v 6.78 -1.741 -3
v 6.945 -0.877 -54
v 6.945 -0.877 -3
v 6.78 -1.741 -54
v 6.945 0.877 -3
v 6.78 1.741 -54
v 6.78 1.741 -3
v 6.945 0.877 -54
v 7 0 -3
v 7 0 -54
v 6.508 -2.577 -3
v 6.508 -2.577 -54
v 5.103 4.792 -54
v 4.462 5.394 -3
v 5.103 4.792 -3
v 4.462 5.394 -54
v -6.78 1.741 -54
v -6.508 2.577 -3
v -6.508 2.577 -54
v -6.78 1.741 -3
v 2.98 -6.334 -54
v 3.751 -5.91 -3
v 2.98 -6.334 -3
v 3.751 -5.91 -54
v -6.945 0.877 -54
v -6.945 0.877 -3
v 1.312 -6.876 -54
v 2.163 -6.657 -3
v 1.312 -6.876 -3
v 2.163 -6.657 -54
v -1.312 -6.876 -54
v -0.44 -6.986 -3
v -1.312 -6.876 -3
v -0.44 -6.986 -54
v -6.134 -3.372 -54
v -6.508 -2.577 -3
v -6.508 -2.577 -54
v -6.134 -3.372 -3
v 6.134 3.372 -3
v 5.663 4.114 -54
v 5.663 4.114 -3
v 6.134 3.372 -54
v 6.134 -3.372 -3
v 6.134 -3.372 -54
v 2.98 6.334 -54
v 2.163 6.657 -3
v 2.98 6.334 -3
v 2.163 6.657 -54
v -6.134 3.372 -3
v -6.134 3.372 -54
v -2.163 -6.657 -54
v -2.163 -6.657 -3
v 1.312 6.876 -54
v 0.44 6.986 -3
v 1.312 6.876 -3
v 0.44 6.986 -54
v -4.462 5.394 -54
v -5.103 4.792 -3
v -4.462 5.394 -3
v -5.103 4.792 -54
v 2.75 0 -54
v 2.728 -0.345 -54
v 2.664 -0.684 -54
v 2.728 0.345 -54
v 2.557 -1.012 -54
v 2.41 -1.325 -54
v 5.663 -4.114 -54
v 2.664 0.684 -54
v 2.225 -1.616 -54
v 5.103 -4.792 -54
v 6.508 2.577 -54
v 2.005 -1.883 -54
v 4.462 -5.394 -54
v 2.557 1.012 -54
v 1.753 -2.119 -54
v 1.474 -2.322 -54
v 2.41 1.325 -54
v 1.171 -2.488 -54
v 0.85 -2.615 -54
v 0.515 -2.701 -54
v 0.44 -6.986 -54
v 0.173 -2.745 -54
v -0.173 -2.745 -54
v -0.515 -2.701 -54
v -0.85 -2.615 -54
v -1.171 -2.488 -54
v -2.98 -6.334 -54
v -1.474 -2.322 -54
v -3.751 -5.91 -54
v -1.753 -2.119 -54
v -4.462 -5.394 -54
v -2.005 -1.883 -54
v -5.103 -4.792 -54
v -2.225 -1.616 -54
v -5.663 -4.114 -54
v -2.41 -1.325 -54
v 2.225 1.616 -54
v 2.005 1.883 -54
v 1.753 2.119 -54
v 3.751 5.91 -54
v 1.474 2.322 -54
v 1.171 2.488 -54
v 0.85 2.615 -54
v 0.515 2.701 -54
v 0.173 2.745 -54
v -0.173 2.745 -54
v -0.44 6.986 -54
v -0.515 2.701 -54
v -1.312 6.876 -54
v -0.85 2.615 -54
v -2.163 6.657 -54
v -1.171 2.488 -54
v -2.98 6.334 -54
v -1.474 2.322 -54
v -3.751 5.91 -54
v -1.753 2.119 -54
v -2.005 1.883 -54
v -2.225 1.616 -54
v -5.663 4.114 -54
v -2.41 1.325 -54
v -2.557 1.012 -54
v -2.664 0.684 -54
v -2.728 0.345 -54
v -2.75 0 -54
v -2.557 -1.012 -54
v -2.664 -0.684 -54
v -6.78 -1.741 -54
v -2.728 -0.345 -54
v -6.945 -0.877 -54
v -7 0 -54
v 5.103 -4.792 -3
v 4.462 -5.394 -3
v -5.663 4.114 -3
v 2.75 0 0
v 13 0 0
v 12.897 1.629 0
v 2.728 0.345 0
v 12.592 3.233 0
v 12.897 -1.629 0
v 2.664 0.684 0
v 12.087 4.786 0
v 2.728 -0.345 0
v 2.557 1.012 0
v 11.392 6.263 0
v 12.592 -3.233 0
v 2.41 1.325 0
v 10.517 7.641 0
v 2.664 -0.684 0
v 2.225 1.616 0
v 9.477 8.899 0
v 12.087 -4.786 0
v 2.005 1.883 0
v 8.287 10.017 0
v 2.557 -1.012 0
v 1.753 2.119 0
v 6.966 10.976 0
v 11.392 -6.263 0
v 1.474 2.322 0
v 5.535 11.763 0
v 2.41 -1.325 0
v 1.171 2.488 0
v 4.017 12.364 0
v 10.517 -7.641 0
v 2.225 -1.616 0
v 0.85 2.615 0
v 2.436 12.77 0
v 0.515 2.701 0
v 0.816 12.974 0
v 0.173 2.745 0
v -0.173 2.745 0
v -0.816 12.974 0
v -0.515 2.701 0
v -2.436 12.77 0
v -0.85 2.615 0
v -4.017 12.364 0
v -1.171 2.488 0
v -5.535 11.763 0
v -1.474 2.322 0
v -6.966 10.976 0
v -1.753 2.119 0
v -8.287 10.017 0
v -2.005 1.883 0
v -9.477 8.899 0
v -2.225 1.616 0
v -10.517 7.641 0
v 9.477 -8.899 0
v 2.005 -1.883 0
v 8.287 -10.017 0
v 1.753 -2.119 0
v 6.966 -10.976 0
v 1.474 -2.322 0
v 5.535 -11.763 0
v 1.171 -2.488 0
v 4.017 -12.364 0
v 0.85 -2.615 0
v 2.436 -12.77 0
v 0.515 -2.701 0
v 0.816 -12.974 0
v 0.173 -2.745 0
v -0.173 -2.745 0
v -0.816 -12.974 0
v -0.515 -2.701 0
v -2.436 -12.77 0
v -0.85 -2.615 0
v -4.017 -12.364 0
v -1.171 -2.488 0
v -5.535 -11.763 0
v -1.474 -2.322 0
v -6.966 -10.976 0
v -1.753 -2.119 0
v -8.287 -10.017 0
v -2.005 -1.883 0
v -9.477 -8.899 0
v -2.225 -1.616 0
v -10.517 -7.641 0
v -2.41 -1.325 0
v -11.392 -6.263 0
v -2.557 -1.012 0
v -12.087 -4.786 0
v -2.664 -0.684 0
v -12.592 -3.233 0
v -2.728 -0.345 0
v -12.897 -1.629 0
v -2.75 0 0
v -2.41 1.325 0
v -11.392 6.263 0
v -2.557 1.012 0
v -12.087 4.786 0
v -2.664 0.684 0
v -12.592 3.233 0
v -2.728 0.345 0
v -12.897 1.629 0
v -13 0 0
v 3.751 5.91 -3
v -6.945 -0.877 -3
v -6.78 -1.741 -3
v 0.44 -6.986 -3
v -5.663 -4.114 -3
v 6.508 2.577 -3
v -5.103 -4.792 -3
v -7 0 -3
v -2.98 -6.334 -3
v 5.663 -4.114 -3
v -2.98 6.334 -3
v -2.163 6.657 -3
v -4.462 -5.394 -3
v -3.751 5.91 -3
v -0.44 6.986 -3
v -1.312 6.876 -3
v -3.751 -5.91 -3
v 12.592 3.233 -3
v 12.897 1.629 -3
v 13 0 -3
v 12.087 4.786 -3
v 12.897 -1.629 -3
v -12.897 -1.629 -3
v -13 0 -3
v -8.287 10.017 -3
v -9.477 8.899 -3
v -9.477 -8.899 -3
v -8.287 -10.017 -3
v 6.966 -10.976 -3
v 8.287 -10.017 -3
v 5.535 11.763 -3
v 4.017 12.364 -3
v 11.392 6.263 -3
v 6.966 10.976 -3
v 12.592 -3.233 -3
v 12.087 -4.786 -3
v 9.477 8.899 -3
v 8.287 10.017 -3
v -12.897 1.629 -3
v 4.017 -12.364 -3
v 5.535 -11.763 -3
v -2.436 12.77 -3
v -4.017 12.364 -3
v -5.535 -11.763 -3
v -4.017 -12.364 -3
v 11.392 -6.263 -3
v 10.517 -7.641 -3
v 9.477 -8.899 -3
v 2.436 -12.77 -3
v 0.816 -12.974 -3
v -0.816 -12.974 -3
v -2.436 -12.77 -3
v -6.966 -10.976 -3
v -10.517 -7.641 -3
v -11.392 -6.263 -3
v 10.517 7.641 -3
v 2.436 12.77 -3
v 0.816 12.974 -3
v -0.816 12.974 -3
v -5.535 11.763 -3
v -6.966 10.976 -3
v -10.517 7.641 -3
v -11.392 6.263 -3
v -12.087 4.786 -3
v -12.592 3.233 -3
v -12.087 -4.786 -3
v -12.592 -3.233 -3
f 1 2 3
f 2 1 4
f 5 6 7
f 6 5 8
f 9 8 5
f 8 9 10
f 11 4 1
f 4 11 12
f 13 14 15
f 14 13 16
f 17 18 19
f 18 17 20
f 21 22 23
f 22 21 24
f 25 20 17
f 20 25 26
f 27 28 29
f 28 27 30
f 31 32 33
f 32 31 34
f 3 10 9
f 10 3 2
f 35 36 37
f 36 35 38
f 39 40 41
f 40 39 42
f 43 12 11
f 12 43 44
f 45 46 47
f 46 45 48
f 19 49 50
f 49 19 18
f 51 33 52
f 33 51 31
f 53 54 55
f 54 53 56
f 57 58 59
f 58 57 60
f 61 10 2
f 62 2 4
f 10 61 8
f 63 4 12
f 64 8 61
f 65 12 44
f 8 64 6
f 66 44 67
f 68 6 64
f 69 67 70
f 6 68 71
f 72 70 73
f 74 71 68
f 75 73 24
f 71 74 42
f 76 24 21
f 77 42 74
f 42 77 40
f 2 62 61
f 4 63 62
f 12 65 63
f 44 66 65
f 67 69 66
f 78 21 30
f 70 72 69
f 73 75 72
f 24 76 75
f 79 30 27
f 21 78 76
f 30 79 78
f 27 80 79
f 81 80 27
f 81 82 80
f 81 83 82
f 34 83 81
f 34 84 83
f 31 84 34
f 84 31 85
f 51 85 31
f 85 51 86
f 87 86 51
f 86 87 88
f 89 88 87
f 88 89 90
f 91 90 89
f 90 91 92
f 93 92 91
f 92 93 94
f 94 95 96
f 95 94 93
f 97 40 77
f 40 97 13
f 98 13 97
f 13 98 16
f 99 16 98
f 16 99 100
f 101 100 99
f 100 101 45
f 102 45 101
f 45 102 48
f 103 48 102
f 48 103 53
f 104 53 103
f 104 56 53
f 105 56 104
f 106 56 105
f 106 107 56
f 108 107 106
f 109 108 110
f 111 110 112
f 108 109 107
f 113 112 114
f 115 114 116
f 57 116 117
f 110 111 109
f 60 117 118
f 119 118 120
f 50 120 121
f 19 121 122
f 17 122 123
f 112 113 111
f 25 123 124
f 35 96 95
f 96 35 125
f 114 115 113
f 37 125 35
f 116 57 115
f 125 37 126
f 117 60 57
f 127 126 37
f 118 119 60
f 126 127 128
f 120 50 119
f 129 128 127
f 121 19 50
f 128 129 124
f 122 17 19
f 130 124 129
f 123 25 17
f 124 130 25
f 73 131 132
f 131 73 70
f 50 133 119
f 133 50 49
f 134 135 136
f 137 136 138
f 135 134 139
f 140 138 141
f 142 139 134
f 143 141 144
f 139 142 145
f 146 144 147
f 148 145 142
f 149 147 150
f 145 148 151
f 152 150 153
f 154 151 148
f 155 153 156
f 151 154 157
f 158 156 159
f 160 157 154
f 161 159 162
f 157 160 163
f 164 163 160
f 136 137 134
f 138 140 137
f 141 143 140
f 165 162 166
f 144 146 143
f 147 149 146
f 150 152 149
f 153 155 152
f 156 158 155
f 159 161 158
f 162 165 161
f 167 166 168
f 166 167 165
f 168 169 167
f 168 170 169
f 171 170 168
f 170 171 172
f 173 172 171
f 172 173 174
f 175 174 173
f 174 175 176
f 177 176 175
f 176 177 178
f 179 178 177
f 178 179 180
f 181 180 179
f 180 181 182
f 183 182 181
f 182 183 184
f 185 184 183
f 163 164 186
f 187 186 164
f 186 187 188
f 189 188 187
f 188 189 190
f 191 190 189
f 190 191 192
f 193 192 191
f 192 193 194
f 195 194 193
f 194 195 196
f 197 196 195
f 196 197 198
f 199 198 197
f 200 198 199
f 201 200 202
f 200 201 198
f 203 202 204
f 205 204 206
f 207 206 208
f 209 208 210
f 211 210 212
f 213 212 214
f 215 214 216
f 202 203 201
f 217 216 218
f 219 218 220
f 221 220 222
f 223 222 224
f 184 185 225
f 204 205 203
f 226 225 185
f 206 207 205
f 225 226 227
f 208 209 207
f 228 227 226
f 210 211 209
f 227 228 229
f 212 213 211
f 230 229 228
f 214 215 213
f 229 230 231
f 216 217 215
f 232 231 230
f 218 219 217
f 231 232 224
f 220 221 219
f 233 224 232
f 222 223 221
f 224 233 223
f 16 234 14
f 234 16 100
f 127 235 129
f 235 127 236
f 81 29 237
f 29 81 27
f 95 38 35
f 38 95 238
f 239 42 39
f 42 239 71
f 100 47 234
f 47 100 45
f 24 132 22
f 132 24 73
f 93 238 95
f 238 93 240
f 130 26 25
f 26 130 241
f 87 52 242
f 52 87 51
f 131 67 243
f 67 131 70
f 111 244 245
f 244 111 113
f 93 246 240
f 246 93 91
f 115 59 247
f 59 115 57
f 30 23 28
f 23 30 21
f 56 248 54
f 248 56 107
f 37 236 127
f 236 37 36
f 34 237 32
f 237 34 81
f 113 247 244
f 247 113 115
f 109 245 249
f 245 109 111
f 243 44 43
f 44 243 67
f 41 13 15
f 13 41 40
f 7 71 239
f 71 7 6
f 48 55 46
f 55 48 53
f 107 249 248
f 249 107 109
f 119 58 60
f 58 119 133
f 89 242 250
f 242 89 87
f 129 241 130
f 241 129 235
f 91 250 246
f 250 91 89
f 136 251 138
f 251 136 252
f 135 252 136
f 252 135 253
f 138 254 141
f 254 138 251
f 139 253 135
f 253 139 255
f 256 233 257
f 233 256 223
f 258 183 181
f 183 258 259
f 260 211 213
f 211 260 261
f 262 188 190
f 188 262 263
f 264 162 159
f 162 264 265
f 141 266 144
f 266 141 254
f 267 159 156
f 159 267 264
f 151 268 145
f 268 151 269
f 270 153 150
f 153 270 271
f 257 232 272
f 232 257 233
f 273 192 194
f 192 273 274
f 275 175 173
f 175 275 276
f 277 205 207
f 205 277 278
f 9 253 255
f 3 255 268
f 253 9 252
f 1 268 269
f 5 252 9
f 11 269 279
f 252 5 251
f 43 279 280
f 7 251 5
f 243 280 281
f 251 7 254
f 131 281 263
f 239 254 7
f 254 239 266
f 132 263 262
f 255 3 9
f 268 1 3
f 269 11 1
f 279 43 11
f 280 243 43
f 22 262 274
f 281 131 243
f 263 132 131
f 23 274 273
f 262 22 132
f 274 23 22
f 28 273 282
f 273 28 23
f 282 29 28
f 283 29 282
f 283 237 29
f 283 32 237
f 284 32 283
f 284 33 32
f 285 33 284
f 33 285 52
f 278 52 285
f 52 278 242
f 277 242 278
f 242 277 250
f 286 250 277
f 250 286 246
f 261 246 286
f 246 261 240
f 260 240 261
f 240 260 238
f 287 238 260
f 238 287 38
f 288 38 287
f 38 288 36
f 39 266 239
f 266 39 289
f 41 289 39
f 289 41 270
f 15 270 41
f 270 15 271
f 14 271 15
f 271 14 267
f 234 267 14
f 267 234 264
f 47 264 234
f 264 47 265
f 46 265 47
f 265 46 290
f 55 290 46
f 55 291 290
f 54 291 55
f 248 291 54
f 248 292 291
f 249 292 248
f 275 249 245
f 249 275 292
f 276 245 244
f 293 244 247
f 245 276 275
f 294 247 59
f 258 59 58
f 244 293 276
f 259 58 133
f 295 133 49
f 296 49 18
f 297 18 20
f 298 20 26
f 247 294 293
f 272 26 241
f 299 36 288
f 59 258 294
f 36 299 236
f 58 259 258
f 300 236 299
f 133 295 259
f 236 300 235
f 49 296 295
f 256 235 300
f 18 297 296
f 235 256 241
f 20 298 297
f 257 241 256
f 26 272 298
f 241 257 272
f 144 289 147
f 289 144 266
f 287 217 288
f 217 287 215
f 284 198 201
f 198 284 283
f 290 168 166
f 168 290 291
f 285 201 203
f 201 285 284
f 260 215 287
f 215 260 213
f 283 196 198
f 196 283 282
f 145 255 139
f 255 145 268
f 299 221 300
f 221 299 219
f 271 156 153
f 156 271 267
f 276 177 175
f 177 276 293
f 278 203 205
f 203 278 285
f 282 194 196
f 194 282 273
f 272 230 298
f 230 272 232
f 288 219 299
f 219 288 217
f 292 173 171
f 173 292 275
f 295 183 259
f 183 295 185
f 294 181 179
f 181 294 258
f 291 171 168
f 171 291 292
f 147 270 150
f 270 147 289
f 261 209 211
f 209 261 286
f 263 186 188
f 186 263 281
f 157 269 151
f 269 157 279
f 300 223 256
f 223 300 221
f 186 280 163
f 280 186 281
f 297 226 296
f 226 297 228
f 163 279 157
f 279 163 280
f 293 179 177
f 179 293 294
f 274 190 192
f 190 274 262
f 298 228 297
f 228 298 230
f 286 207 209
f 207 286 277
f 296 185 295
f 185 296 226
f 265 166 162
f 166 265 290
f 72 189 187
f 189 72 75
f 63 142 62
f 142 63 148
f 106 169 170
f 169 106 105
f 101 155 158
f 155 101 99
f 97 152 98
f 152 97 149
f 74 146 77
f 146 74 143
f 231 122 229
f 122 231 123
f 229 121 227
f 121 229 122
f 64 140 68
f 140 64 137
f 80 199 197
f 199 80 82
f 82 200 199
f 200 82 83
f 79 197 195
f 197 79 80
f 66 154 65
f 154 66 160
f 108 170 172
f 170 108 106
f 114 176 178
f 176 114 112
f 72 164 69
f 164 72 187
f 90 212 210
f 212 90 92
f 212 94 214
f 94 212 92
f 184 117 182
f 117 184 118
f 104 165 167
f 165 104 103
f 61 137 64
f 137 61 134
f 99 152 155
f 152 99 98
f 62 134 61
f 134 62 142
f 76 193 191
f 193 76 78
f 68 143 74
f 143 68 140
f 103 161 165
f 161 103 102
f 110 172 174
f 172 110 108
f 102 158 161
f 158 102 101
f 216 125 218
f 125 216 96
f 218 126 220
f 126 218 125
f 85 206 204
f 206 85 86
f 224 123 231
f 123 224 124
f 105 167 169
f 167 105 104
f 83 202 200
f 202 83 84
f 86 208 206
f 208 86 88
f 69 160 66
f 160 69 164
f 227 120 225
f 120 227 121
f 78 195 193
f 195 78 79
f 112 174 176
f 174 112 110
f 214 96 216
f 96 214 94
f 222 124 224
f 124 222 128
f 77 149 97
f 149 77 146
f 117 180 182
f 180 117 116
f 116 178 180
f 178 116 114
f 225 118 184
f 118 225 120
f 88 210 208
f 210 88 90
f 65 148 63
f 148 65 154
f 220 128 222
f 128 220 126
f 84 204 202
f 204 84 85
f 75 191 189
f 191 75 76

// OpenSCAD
$fn = 50;


difference() {
	union() {
		translate(v = [0, 0, -54.0000000000]) {
			cylinder(h = 54, r = 7.0000000000);
		}
		translate(v = [0, 0, -3.0000000000]) {
			cylinder(h = 3, r = 13.0000000000);
		}
	}
	union() {
		#translate(v = [0, 0, -54]) {
			cylinder(h = 54, r = 2.7500000000);
		}
	}
}
